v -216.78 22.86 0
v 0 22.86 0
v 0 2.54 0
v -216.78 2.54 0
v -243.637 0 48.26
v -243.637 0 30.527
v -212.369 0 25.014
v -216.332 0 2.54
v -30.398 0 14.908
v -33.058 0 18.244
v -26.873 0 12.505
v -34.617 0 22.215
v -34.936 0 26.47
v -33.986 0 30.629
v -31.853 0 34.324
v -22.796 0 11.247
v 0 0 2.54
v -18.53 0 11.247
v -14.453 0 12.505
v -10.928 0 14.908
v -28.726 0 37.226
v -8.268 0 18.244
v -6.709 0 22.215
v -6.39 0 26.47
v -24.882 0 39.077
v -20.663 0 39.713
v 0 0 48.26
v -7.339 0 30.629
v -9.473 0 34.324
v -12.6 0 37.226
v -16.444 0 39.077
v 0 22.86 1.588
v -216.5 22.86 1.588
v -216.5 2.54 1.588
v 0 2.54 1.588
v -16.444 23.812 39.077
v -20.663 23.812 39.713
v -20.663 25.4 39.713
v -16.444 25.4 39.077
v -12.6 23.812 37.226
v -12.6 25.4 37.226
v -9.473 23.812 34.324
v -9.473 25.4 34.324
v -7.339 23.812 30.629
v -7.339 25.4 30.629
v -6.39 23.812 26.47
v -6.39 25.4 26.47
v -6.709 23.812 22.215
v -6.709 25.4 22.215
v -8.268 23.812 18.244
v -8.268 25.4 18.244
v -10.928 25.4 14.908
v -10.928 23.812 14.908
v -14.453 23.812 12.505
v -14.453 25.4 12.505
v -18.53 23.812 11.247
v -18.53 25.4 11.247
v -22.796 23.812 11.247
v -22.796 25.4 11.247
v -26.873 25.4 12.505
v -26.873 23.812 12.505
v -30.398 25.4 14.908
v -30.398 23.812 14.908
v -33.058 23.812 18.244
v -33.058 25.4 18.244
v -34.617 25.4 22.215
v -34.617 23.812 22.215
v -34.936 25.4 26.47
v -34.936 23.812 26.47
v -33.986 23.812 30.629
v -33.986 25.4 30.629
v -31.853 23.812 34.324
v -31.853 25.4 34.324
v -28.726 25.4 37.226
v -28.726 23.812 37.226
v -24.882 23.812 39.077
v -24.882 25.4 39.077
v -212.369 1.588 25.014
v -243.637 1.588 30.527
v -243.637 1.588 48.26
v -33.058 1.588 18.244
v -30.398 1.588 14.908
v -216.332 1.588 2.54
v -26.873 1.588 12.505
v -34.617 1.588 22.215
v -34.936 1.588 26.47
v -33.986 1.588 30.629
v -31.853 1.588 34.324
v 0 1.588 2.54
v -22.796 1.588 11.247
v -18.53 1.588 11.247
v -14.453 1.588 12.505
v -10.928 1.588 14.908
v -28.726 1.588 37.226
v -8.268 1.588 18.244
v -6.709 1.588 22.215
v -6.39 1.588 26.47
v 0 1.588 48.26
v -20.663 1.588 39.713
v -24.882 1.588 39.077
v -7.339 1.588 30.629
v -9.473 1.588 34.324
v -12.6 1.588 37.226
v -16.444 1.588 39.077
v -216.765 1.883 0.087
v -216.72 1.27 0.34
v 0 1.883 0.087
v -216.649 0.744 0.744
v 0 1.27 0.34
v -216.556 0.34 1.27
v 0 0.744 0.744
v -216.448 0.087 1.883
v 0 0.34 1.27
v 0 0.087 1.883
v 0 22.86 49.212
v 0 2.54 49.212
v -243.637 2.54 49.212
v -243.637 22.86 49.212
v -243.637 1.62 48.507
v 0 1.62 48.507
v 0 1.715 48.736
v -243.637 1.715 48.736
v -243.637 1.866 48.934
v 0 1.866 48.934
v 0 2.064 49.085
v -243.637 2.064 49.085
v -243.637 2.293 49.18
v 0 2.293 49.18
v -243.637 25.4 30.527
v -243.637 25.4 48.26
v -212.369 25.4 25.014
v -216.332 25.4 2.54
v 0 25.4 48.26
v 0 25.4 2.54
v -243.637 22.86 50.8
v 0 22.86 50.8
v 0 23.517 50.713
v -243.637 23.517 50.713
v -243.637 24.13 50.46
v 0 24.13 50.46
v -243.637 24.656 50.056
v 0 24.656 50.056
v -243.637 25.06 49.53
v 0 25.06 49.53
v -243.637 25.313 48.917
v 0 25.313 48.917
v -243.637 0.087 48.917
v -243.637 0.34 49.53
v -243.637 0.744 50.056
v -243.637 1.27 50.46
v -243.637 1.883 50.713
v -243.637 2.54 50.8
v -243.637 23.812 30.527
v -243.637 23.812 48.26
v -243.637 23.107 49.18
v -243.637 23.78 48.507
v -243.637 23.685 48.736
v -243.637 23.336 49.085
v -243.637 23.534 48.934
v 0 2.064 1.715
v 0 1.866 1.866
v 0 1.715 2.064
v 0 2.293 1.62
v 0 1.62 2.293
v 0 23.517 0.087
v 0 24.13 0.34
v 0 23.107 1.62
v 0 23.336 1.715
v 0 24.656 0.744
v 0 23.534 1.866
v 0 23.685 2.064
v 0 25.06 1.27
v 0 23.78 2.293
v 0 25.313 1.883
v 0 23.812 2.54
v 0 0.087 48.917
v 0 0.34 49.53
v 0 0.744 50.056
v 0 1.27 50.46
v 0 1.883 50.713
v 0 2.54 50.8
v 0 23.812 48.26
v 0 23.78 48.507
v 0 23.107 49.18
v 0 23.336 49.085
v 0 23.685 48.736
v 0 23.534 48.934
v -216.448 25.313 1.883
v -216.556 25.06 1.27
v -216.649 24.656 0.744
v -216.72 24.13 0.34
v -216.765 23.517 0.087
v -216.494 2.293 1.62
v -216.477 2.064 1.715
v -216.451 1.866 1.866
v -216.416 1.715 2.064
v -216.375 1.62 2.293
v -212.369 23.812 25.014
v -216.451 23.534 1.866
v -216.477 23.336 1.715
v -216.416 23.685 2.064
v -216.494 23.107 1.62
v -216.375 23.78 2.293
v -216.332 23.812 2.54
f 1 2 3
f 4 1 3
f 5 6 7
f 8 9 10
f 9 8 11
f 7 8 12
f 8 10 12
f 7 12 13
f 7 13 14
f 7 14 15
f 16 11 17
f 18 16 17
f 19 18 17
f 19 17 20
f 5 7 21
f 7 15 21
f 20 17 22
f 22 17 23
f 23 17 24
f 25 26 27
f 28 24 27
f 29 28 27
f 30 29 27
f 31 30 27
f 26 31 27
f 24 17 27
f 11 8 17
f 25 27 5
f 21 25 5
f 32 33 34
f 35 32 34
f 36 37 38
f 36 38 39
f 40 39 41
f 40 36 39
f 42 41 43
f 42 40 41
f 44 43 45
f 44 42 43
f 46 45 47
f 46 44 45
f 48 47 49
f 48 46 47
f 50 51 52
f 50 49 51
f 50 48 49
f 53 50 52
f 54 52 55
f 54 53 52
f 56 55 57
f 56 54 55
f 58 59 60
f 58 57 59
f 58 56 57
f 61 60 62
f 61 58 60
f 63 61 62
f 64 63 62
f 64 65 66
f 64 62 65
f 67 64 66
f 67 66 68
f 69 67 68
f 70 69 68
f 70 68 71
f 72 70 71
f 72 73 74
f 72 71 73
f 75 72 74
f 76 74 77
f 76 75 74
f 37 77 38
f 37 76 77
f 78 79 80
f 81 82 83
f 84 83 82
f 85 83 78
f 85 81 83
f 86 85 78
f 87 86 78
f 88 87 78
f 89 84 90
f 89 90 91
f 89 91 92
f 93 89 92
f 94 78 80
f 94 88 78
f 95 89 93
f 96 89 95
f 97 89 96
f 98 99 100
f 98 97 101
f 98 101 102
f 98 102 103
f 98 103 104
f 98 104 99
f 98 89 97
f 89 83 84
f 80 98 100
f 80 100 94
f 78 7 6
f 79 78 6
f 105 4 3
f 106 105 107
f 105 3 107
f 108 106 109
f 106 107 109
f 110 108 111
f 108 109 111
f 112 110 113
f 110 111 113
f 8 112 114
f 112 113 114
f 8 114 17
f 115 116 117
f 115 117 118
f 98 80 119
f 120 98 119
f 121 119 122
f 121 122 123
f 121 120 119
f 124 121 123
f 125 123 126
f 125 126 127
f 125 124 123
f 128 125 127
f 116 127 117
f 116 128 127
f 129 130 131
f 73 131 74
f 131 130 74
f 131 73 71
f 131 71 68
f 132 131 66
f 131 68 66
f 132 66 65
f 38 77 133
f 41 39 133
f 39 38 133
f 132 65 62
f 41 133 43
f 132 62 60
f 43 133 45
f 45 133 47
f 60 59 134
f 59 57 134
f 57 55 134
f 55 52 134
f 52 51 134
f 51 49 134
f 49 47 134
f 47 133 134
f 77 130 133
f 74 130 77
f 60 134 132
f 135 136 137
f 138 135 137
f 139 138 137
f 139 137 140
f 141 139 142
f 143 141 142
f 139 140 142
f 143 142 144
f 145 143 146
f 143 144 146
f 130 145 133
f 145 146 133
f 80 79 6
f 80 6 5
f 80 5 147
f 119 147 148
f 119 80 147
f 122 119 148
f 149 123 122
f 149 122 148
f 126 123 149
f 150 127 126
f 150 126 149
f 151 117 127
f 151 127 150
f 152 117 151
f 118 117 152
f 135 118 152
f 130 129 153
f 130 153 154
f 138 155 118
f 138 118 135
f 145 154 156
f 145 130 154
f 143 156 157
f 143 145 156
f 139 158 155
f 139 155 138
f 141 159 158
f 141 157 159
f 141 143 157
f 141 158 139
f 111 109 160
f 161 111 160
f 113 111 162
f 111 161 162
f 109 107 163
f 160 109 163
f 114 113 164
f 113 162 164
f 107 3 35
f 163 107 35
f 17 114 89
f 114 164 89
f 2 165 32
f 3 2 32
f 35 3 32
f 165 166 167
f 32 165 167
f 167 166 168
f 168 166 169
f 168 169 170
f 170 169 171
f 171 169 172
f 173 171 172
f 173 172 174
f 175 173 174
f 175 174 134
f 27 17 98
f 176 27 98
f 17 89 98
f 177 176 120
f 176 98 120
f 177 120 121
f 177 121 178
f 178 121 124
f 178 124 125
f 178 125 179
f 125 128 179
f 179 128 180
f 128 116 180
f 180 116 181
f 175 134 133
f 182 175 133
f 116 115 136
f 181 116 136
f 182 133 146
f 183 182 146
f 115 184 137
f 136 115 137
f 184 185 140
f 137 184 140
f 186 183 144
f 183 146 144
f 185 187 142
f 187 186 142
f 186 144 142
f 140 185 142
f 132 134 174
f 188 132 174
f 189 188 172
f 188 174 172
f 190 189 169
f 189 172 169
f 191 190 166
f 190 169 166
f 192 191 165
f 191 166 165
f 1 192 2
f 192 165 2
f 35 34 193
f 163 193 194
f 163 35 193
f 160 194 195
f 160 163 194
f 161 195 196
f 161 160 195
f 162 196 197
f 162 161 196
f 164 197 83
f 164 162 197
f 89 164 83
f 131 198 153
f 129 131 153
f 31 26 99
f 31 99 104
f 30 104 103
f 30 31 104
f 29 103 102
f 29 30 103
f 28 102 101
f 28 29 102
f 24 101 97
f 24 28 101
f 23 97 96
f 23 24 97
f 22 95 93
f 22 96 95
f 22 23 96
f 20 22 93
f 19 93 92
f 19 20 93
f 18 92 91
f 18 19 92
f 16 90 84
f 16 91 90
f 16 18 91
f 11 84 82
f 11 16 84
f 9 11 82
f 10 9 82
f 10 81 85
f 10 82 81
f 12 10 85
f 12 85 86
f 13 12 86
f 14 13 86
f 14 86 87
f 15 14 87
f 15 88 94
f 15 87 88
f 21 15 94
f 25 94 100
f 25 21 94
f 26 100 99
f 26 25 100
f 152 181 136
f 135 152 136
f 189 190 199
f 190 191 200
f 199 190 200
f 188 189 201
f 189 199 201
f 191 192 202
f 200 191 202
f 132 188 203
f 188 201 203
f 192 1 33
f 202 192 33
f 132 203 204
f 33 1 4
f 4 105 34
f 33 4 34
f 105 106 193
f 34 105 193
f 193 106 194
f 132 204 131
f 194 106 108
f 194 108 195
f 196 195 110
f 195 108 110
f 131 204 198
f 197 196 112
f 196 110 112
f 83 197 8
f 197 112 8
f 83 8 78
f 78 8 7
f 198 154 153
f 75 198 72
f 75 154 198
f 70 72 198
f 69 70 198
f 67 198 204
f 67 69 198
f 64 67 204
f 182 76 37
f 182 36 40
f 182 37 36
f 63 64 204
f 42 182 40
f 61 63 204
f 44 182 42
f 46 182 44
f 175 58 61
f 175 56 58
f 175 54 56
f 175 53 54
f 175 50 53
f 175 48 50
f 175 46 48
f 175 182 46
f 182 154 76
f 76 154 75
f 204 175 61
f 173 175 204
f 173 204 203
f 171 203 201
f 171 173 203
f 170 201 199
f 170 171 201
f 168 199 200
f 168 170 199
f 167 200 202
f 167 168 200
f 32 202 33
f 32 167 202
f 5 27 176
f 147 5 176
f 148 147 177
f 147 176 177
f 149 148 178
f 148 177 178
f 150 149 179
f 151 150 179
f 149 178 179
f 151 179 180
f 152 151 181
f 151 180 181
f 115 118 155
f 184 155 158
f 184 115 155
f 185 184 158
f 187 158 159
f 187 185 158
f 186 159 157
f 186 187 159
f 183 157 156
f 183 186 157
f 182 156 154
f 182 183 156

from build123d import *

# Parameters (mm, degrees)
EXTRUDE_THIN1_DEPTH     = 243.6368
CUT_EXTRUDE1_DEPTH      = 251.169323288
CUT_EXTRUDE1_DEPTH_BACK = 251.169323288
SKETCH4_R               = 14.3129


with BuildPart() as part:
    # Sketch1 → Extrude-Thin1 (new body)
    with BuildSketch(Plane(origin=(0, 0, 0), x_dir=(0, 0, -1), z_dir=(1, 0, 0))):
        with BuildLine():
            Line((-48.26, 25.4), (-2.54, 25.4))
            ThreePointArc((-2.54, 25.4), (-0.743948776, 24.656051224), (0, 22.86))
            Line((0, 22.86), (0, 2.54))
            ThreePointArc((0, 2.54), (-0.743948776, 0.743948776), (-2.54, 0))
            Line((-2.54, 0), (-48.26, 0))
            ThreePointArc((-48.26, 0), (-50.056051224, 0.743948776), (-50.8, 2.54))
            Line((-50.8, 2.54), (-50.8, 22.86))
            ThreePointArc((-50.8, 22.86), (-50.056051224, 24.656051224), (-48.26, 25.4))
        make_face()
        with BuildLine():
            Line((-48.26, 23.8125), (-2.54, 23.8125))
            ThreePointArc((-2.54, 23.8125), (-1.866480791, 23.533519209), (-1.5875, 22.86))
            Line((-1.5875, 22.86), (-1.5875, 2.54))
            ThreePointArc((-1.5875, 2.54), (-1.866480791, 1.866480791), (-2.54, 1.5875))
            Line((-2.54, 1.5875), (-48.26, 1.5875))
            ThreePointArc((-48.26, 1.5875), (-48.933519209, 1.866480791), (-49.2125, 2.54))
            Line((-49.2125, 2.54), (-49.2125, 22.86))
            ThreePointArc((-49.2125, 22.86), (-48.933519209, 23.533519209), (-48.26, 23.8125))
        make_face(mode=Mode.SUBTRACT)
    extrude(amount=-EXTRUDE_THIN1_DEPTH)

    # Sketch4 → Cut-Extrude1 (cut, two sides: drawn at the far end of the back side and taken through both)
    with BuildSketch(Plane(origin=(0, 25.4, 0), x_dir=(1, 0, 0), z_dir=(0, 1, 0)).offset(-CUT_EXTRUDE1_DEPTH_BACK)):
        with Locations(Location((-20.6629, -25.4, 0), (0, 0, 270))):
            Circle(SKETCH4_R)
        Polygon((-216.779817555, 0), (-212.369153842, -25.014116927), (-243.6368, -30.527446567), (-243.6368, 0), align=None)
    extrude(amount=CUT_EXTRUDE1_DEPTH + CUT_EXTRUDE1_DEPTH_BACK, mode=Mode.SUBTRACT)


solid = part.part
